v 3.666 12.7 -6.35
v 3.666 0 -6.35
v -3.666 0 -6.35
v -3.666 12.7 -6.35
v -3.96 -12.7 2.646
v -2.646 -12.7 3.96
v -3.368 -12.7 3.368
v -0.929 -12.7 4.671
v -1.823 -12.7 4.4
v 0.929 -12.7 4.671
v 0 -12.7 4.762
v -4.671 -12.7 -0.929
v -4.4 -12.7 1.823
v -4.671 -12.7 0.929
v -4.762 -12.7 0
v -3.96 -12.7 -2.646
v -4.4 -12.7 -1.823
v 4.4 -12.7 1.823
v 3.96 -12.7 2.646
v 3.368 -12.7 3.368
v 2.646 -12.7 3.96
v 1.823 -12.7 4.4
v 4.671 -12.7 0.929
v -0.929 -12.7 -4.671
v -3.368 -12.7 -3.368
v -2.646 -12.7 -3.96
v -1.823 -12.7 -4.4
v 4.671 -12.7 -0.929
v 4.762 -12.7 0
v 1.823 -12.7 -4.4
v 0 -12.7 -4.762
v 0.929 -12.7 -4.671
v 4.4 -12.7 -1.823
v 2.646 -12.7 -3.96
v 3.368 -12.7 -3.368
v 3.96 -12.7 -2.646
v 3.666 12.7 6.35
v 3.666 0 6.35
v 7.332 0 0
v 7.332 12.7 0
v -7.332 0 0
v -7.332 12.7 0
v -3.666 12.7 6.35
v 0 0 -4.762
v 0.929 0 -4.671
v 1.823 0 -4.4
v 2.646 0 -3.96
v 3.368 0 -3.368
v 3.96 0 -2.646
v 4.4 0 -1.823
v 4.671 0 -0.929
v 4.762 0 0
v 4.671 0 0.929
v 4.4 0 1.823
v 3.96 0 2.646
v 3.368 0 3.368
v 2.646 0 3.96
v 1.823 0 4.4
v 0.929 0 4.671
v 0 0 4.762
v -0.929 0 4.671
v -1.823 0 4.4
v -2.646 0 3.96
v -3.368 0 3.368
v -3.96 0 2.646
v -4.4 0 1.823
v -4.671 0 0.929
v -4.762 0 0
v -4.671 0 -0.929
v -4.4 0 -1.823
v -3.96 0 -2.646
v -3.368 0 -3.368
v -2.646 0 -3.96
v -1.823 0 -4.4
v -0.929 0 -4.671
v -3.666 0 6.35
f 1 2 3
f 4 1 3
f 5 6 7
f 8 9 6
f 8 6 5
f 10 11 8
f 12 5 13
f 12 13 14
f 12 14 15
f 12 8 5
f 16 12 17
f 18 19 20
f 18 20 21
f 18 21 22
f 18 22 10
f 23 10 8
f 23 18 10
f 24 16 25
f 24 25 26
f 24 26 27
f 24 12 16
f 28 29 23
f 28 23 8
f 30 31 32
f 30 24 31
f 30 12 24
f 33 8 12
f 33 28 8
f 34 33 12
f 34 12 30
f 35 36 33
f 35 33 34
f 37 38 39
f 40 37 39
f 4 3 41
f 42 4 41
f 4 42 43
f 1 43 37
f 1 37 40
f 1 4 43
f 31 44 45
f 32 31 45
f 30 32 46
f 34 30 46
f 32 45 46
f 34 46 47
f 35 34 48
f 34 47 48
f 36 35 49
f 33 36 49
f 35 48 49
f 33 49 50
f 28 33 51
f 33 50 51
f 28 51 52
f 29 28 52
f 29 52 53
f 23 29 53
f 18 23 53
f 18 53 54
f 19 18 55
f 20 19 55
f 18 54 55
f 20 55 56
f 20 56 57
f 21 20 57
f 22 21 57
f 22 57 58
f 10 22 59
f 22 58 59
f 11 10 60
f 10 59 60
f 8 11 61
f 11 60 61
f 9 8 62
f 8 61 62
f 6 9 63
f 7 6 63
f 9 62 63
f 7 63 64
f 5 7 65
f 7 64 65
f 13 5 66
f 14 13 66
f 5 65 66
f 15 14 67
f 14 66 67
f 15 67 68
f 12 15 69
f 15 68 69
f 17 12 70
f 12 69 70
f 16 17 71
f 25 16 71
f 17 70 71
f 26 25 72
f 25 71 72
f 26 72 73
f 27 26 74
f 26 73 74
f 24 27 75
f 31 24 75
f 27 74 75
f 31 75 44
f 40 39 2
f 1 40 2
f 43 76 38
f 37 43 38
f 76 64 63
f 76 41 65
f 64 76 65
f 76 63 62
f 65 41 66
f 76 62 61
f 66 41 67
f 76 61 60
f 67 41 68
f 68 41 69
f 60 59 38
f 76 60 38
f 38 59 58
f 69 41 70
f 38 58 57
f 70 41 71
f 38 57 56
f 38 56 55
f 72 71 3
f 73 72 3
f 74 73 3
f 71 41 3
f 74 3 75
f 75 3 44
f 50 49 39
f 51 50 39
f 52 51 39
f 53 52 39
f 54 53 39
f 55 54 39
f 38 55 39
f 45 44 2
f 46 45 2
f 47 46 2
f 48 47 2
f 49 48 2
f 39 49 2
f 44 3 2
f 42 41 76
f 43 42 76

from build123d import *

# Parameters (mm, degrees)
EXTRUDE1_DEPTH = 12.7
SKETCH2_R      = 4.7625
EXTRUDE2_DEPTH = 12.7


with BuildPart() as part:
    # Sketch1 → Extrude1 (new body)
    with BuildSketch(Plane(origin=(0, 0, 0), x_dir=(1, 0, 0), z_dir=(0, 1, 0))):
        Polygon((3.666174209, 6.35), (-3.666174209, 6.35), (-7.332348419, 0), (-3.666174209, -6.35), (3.666174209, -6.35), (7.332348419, 0), align=None)
    extrude(amount=EXTRUDE1_DEPTH)

    # Sketch2 → Extrude2 (add)
    with BuildSketch(Plane.XZ):
        with Locations(Location((0, 0, 0), (0, 0, 270))):
            Circle(SKETCH2_R)
    extrude(amount=EXTRUDE2_DEPTH)


solid = part.part
